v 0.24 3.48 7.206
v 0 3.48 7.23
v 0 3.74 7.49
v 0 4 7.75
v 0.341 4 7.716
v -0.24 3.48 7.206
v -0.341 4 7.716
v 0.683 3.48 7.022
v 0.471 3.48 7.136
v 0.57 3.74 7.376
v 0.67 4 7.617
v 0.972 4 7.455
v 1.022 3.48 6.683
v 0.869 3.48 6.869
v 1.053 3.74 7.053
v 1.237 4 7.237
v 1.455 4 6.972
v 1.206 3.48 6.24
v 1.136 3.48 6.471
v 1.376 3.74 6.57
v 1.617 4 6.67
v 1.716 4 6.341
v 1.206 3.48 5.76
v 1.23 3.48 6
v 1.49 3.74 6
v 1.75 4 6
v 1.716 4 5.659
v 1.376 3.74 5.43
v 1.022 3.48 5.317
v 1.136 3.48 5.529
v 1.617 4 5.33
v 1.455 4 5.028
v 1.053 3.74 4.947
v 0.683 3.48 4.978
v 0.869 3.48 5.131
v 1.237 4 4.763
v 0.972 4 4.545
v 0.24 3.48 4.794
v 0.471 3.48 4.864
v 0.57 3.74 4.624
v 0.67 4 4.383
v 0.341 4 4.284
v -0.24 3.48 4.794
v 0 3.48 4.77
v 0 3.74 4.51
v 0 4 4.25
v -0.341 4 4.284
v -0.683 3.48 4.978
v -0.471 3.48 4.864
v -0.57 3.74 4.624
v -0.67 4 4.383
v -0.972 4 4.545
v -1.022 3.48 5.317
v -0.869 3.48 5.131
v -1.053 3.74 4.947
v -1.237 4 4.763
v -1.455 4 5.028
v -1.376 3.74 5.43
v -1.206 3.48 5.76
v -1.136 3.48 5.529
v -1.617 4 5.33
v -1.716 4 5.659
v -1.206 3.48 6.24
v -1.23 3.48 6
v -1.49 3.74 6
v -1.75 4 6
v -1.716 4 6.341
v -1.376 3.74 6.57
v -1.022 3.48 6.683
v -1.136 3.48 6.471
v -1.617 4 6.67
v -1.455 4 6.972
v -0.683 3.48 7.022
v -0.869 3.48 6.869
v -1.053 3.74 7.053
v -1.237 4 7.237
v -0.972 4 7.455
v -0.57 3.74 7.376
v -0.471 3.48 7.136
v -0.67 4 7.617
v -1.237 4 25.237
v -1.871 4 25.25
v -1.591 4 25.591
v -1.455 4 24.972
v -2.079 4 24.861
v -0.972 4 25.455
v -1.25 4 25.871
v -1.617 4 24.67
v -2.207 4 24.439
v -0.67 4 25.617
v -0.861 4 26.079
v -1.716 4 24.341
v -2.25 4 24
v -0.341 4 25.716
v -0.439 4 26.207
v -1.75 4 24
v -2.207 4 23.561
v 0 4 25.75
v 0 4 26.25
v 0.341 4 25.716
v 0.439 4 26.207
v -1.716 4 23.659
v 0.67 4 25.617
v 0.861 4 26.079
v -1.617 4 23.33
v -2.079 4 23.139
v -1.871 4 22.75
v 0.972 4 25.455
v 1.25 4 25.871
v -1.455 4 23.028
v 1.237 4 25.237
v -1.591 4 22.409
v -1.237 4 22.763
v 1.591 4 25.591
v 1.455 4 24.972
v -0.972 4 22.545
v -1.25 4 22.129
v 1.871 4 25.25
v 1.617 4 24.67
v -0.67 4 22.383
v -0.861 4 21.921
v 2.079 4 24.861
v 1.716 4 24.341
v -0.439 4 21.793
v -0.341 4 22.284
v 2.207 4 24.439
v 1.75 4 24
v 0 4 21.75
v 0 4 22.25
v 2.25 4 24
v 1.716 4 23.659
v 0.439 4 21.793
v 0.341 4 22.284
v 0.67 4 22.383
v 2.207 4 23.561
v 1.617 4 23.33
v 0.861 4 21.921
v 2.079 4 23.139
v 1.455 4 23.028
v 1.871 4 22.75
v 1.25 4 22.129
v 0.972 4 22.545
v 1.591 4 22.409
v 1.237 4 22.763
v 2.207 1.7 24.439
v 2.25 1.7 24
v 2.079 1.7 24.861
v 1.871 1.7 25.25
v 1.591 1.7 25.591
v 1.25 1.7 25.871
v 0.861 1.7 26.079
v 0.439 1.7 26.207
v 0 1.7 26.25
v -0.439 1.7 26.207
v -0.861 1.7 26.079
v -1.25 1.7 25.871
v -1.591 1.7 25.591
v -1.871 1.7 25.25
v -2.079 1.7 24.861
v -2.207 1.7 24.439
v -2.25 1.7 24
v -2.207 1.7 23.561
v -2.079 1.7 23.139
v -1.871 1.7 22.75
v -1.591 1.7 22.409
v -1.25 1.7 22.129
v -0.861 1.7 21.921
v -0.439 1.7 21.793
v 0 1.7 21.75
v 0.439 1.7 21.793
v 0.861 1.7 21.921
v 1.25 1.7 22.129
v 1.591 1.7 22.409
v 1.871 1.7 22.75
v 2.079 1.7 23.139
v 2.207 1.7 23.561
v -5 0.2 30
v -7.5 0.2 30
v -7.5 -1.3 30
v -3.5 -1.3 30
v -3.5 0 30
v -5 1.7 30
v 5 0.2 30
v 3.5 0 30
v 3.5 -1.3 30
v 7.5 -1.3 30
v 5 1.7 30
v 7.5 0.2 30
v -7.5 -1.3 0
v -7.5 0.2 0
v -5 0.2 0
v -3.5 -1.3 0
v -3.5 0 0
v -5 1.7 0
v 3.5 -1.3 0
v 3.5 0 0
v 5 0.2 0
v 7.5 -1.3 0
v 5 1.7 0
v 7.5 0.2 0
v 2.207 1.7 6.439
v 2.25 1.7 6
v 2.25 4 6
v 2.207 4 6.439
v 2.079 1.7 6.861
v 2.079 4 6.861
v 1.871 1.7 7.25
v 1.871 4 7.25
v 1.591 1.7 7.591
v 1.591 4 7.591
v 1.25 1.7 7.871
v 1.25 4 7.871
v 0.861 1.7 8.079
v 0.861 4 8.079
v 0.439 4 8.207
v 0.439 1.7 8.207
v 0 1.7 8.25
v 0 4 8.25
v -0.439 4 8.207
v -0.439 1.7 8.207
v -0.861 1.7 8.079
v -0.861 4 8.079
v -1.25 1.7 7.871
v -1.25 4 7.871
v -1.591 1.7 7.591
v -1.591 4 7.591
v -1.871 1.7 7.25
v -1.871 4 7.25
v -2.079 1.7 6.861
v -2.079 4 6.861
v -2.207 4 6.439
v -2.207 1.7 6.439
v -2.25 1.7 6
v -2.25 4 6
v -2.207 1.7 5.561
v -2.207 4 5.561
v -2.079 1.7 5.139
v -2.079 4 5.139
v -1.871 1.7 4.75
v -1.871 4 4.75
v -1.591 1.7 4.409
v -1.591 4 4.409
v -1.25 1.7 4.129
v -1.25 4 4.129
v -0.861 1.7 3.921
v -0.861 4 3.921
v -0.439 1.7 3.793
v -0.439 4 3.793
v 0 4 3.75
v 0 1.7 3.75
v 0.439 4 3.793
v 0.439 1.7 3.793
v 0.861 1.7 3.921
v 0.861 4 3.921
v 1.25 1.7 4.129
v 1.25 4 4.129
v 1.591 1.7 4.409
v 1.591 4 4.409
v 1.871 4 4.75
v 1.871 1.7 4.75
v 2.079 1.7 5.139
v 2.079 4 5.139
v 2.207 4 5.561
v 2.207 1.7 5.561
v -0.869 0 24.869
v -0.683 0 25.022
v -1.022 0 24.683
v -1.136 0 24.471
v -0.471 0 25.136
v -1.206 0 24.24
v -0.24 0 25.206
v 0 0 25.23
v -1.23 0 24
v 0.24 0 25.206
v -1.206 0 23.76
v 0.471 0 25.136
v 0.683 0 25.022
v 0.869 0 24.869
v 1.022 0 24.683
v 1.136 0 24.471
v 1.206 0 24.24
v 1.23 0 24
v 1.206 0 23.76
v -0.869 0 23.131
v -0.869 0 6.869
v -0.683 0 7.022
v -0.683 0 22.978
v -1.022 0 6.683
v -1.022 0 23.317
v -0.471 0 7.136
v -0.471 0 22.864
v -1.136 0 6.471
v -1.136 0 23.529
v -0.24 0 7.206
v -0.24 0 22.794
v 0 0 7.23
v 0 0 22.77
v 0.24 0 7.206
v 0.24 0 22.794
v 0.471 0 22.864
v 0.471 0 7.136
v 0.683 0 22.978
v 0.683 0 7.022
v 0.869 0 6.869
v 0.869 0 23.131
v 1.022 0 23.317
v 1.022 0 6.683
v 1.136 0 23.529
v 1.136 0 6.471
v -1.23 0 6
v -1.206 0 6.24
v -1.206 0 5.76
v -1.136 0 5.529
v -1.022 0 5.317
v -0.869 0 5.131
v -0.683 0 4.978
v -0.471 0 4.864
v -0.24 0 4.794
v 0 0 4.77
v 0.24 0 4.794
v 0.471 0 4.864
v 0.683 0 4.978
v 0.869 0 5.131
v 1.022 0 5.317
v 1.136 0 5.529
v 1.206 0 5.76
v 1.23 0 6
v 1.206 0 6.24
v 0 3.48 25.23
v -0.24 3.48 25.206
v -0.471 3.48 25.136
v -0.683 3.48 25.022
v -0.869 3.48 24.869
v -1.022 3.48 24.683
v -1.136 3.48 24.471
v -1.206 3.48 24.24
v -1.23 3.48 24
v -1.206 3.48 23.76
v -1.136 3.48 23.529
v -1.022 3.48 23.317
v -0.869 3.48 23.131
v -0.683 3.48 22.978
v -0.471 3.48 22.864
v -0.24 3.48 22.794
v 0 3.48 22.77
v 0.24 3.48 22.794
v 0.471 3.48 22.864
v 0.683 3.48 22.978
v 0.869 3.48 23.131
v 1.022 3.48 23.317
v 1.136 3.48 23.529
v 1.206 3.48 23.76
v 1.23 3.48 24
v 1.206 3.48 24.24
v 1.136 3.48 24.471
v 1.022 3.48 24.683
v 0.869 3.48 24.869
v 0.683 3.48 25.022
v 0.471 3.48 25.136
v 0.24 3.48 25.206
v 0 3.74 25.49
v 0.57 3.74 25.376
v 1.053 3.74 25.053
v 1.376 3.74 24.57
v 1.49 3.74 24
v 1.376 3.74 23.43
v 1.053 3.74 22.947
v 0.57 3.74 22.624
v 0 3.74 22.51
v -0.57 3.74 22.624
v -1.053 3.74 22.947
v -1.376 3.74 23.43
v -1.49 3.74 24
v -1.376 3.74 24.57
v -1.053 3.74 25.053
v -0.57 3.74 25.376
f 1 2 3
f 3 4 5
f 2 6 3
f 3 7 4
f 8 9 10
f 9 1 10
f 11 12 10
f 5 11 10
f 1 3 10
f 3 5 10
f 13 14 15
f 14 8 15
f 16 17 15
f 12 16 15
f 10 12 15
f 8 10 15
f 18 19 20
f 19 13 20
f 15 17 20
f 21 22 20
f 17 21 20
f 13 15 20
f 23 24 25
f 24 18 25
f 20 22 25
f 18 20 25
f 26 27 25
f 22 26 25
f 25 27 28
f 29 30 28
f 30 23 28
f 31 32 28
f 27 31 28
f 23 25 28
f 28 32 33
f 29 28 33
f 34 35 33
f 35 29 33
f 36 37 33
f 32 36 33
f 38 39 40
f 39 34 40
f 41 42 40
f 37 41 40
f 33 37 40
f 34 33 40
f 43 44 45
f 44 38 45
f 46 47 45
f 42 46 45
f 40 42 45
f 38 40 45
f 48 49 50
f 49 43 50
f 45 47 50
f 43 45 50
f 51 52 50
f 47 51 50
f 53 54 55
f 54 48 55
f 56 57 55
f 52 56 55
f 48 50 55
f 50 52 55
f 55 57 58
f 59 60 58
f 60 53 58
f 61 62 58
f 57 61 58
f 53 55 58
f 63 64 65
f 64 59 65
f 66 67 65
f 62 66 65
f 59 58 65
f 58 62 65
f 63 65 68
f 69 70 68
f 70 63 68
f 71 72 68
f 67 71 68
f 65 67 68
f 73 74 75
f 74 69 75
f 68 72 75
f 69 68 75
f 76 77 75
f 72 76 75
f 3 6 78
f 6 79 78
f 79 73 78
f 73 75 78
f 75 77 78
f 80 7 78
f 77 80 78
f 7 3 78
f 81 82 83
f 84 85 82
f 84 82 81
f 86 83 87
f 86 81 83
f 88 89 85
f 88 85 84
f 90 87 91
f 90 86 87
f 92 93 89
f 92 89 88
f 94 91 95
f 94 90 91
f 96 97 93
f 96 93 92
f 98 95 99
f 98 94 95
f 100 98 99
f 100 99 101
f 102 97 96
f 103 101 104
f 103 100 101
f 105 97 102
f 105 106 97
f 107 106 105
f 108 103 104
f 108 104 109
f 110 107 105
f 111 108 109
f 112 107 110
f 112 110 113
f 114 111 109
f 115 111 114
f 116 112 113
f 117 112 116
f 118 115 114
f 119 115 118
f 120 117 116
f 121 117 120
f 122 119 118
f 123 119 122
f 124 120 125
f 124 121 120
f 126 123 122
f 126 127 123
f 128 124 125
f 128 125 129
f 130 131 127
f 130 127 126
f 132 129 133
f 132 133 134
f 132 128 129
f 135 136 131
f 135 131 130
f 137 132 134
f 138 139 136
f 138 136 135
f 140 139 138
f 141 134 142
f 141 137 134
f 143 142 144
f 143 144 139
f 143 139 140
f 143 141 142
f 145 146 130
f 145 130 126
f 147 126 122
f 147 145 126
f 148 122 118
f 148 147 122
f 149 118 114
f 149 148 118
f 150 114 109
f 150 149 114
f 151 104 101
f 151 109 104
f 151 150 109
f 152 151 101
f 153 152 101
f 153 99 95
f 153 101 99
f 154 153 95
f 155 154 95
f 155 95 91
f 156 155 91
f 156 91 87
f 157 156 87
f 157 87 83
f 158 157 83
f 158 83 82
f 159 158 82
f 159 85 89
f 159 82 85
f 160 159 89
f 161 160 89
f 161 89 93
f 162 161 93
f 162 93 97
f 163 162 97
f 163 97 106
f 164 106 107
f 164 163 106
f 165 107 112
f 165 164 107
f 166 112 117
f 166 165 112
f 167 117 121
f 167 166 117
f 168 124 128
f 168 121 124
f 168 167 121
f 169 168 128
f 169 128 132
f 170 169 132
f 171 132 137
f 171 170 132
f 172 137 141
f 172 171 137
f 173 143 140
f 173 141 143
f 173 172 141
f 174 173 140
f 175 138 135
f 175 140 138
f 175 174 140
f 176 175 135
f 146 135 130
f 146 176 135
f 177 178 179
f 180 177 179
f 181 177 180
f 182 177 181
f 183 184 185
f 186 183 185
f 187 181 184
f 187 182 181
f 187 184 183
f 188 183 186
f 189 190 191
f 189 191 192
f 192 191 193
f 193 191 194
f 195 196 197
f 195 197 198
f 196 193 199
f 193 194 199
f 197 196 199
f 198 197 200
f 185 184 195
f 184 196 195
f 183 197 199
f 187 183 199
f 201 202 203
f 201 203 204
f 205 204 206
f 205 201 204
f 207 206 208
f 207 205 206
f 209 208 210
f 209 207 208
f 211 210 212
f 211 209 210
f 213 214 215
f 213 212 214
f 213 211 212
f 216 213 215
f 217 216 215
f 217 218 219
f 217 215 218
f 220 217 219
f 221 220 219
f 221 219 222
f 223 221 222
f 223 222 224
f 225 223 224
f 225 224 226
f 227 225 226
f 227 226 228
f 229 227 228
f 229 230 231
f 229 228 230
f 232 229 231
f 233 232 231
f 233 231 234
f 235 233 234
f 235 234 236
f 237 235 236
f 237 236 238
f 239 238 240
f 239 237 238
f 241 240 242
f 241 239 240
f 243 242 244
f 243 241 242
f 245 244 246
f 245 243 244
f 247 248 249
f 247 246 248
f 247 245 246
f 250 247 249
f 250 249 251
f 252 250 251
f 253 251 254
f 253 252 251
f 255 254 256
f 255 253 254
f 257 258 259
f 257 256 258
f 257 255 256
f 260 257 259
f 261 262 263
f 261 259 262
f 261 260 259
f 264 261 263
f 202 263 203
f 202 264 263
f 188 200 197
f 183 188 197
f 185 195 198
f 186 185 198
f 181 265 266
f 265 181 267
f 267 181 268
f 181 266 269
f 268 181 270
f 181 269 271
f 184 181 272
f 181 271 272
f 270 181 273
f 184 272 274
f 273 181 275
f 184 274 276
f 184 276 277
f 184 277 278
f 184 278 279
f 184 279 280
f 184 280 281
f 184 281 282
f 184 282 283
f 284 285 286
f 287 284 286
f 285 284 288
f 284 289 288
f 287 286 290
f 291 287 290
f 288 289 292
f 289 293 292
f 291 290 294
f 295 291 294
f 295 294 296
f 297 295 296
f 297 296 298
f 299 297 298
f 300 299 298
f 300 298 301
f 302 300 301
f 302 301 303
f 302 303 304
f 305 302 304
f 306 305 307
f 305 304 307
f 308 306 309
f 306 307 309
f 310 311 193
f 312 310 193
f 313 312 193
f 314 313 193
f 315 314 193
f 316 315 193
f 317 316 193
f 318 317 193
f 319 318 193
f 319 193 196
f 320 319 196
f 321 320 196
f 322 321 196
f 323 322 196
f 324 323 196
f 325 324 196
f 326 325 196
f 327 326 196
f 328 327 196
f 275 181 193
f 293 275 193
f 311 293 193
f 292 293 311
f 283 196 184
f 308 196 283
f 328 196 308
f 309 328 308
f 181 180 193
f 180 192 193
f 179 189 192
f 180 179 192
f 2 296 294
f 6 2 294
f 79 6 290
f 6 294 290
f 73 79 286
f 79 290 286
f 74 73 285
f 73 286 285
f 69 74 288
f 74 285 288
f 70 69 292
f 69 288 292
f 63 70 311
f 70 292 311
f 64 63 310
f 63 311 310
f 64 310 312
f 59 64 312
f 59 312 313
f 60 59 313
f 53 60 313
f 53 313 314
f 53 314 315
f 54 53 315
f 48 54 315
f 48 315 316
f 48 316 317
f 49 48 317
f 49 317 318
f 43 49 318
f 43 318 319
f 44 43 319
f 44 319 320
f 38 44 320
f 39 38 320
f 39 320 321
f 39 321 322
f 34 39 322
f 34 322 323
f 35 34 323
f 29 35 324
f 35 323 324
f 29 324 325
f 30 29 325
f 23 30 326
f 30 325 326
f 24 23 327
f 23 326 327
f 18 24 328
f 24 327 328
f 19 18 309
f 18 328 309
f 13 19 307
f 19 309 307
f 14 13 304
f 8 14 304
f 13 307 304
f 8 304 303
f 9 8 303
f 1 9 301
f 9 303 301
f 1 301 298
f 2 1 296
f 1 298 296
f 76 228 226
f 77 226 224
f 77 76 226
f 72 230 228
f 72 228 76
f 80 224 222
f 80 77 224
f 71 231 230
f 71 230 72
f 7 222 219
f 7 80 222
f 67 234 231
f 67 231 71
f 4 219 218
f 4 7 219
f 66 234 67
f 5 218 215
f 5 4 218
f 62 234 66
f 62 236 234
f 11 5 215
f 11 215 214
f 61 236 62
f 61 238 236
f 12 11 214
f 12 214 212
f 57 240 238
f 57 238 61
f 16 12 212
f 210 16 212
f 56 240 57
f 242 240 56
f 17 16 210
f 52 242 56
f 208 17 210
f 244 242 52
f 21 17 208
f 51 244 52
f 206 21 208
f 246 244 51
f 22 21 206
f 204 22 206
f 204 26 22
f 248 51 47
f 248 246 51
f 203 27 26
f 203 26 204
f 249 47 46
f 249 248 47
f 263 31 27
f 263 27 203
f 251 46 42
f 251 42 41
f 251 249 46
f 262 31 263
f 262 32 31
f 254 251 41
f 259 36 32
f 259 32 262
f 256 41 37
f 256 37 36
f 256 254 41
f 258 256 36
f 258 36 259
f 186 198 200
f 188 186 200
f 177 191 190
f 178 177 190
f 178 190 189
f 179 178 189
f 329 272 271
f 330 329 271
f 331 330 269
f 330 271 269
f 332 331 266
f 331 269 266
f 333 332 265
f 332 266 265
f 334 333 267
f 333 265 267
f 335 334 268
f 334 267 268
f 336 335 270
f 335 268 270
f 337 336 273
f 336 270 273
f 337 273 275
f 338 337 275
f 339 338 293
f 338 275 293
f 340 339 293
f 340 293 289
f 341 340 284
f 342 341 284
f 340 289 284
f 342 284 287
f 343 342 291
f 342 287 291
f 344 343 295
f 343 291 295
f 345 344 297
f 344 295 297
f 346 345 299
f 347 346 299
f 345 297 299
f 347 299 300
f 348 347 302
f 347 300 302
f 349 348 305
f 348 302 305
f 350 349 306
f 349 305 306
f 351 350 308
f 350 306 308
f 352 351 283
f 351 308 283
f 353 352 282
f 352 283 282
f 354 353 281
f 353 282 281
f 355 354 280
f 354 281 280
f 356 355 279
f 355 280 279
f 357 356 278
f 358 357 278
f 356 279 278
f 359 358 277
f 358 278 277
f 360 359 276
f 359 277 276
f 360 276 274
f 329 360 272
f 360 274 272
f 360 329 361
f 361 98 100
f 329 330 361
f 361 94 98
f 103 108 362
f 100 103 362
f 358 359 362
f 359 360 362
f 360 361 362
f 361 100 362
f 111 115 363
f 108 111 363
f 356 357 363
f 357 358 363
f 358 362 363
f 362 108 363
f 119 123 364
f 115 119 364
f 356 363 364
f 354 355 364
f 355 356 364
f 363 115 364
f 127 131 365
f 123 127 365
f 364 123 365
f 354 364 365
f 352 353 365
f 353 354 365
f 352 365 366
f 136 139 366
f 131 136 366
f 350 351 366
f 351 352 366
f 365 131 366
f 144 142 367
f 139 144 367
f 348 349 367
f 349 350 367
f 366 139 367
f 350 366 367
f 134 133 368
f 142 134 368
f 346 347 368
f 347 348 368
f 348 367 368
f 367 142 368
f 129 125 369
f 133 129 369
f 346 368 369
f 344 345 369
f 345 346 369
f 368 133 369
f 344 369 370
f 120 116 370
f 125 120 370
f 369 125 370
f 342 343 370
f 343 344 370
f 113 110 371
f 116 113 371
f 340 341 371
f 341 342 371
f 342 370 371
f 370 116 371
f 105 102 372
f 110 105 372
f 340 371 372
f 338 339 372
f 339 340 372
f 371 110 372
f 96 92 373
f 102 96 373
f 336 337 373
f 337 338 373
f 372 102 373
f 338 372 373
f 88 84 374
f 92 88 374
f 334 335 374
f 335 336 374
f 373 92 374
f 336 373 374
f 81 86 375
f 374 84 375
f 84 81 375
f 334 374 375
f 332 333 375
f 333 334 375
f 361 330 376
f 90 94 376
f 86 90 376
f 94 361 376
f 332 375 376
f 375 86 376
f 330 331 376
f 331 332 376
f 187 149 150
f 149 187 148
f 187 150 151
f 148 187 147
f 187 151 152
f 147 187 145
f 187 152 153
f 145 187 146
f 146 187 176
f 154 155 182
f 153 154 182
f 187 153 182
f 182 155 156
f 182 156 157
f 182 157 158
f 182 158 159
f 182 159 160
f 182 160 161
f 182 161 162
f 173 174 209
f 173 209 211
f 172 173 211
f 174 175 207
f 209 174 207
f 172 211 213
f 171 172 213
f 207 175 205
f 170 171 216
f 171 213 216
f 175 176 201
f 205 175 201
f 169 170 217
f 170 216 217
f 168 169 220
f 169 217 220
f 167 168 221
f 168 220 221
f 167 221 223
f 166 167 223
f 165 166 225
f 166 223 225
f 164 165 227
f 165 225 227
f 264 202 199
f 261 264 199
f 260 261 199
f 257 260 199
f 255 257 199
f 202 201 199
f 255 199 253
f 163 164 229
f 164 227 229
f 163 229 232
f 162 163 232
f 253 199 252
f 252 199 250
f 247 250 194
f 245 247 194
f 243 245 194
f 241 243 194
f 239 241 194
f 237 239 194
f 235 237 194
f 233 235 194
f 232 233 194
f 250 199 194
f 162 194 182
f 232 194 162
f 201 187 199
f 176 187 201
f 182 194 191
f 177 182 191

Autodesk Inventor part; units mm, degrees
ref_plane "YZ Plane" through (0, 0, 0) normal (1, 0, 0) x (0, 1, 0)
ref_plane "XZ Plane" through (0, 0, 0) normal (0, 1, 0) x (-1, 0, 0)
ref_plane "XY Plane" through (0, 0, 0) normal (0, 0, 1) x (1, 0, 0)
sketch "Skizze1" plane through (0, 0, 0) normal (0, 0, 1) x (1, 0, 0)
  line L0 (0, 0) -> (0, 1.7)
  line L1 (0, 1.7) -> (-5, 1.7)
  line L2 (-5, 1.7) -> (-5, 0.2)
  line L3 (-5, 0.2) -> (-7.5, 0.2)
  line L4 (-7.5, 0.2) -> (-7.5, -1.3)
  line L5 (-7.5, -1.3) -> (-3.5, -1.3)
  line L6 (-3.5, -1.3) -> (-3.5, 0)
  line L7 (-3.5, 0) -> (0, 0)
  dimension "d0" = 4
  dimension "d1" = 1.5
  dimension "d2" = 2.5
  dimension "d3" = 3
  dimension "d4" = 5
  dimension "d5" = 1.7
extrude "Extrusion1" add sketch "Skizze1" along normal blind 30
mirror "Spiegeln1" about plane through (0, 0, 0) normal (1, 0, 0) of "Extrusion1"
sketch "Skizze2" plane through (-5, 1.7, 30) normal (0, 1, 0) x (1, 0, 0)
  circle A0 centre (5, 24) radius 2.25
  circle A1 centre (5, 6) radius 2.25
  line L0 (10, 30) -> (0, 30) projected
  line L1 (5, 30) -> (5, 24) construction
  line L2 (5, 6) -> (5, 0) construction
  line L3 (0, 0) -> (10, 0) construction
  dimension "d8" = 4.5
  dimension "d9" = 18
extrude "Extrusion2" add sketch "Skizze2" along normal blind 2.3
sketch "Skizze3" plane through (0, 4, 24) normal (0, 1, 0) x (1, 0, 0)
  circle A0 centre (0, 0) radius 2.25 construction
  circle A1 centre (0, 18) radius 2.25 construction
  point P0 (0, 24)
hole "Bohrung1" at (0, 4, 24) at (0, 4, 6) direction (0, -1, 0) diameter 2.459 end through all countersink diameter 3.5 countersink angle 90 thread size "M3x0.5" class "6H" standard "ISO Metric profile"
properties part number "Igus Gleiter"
